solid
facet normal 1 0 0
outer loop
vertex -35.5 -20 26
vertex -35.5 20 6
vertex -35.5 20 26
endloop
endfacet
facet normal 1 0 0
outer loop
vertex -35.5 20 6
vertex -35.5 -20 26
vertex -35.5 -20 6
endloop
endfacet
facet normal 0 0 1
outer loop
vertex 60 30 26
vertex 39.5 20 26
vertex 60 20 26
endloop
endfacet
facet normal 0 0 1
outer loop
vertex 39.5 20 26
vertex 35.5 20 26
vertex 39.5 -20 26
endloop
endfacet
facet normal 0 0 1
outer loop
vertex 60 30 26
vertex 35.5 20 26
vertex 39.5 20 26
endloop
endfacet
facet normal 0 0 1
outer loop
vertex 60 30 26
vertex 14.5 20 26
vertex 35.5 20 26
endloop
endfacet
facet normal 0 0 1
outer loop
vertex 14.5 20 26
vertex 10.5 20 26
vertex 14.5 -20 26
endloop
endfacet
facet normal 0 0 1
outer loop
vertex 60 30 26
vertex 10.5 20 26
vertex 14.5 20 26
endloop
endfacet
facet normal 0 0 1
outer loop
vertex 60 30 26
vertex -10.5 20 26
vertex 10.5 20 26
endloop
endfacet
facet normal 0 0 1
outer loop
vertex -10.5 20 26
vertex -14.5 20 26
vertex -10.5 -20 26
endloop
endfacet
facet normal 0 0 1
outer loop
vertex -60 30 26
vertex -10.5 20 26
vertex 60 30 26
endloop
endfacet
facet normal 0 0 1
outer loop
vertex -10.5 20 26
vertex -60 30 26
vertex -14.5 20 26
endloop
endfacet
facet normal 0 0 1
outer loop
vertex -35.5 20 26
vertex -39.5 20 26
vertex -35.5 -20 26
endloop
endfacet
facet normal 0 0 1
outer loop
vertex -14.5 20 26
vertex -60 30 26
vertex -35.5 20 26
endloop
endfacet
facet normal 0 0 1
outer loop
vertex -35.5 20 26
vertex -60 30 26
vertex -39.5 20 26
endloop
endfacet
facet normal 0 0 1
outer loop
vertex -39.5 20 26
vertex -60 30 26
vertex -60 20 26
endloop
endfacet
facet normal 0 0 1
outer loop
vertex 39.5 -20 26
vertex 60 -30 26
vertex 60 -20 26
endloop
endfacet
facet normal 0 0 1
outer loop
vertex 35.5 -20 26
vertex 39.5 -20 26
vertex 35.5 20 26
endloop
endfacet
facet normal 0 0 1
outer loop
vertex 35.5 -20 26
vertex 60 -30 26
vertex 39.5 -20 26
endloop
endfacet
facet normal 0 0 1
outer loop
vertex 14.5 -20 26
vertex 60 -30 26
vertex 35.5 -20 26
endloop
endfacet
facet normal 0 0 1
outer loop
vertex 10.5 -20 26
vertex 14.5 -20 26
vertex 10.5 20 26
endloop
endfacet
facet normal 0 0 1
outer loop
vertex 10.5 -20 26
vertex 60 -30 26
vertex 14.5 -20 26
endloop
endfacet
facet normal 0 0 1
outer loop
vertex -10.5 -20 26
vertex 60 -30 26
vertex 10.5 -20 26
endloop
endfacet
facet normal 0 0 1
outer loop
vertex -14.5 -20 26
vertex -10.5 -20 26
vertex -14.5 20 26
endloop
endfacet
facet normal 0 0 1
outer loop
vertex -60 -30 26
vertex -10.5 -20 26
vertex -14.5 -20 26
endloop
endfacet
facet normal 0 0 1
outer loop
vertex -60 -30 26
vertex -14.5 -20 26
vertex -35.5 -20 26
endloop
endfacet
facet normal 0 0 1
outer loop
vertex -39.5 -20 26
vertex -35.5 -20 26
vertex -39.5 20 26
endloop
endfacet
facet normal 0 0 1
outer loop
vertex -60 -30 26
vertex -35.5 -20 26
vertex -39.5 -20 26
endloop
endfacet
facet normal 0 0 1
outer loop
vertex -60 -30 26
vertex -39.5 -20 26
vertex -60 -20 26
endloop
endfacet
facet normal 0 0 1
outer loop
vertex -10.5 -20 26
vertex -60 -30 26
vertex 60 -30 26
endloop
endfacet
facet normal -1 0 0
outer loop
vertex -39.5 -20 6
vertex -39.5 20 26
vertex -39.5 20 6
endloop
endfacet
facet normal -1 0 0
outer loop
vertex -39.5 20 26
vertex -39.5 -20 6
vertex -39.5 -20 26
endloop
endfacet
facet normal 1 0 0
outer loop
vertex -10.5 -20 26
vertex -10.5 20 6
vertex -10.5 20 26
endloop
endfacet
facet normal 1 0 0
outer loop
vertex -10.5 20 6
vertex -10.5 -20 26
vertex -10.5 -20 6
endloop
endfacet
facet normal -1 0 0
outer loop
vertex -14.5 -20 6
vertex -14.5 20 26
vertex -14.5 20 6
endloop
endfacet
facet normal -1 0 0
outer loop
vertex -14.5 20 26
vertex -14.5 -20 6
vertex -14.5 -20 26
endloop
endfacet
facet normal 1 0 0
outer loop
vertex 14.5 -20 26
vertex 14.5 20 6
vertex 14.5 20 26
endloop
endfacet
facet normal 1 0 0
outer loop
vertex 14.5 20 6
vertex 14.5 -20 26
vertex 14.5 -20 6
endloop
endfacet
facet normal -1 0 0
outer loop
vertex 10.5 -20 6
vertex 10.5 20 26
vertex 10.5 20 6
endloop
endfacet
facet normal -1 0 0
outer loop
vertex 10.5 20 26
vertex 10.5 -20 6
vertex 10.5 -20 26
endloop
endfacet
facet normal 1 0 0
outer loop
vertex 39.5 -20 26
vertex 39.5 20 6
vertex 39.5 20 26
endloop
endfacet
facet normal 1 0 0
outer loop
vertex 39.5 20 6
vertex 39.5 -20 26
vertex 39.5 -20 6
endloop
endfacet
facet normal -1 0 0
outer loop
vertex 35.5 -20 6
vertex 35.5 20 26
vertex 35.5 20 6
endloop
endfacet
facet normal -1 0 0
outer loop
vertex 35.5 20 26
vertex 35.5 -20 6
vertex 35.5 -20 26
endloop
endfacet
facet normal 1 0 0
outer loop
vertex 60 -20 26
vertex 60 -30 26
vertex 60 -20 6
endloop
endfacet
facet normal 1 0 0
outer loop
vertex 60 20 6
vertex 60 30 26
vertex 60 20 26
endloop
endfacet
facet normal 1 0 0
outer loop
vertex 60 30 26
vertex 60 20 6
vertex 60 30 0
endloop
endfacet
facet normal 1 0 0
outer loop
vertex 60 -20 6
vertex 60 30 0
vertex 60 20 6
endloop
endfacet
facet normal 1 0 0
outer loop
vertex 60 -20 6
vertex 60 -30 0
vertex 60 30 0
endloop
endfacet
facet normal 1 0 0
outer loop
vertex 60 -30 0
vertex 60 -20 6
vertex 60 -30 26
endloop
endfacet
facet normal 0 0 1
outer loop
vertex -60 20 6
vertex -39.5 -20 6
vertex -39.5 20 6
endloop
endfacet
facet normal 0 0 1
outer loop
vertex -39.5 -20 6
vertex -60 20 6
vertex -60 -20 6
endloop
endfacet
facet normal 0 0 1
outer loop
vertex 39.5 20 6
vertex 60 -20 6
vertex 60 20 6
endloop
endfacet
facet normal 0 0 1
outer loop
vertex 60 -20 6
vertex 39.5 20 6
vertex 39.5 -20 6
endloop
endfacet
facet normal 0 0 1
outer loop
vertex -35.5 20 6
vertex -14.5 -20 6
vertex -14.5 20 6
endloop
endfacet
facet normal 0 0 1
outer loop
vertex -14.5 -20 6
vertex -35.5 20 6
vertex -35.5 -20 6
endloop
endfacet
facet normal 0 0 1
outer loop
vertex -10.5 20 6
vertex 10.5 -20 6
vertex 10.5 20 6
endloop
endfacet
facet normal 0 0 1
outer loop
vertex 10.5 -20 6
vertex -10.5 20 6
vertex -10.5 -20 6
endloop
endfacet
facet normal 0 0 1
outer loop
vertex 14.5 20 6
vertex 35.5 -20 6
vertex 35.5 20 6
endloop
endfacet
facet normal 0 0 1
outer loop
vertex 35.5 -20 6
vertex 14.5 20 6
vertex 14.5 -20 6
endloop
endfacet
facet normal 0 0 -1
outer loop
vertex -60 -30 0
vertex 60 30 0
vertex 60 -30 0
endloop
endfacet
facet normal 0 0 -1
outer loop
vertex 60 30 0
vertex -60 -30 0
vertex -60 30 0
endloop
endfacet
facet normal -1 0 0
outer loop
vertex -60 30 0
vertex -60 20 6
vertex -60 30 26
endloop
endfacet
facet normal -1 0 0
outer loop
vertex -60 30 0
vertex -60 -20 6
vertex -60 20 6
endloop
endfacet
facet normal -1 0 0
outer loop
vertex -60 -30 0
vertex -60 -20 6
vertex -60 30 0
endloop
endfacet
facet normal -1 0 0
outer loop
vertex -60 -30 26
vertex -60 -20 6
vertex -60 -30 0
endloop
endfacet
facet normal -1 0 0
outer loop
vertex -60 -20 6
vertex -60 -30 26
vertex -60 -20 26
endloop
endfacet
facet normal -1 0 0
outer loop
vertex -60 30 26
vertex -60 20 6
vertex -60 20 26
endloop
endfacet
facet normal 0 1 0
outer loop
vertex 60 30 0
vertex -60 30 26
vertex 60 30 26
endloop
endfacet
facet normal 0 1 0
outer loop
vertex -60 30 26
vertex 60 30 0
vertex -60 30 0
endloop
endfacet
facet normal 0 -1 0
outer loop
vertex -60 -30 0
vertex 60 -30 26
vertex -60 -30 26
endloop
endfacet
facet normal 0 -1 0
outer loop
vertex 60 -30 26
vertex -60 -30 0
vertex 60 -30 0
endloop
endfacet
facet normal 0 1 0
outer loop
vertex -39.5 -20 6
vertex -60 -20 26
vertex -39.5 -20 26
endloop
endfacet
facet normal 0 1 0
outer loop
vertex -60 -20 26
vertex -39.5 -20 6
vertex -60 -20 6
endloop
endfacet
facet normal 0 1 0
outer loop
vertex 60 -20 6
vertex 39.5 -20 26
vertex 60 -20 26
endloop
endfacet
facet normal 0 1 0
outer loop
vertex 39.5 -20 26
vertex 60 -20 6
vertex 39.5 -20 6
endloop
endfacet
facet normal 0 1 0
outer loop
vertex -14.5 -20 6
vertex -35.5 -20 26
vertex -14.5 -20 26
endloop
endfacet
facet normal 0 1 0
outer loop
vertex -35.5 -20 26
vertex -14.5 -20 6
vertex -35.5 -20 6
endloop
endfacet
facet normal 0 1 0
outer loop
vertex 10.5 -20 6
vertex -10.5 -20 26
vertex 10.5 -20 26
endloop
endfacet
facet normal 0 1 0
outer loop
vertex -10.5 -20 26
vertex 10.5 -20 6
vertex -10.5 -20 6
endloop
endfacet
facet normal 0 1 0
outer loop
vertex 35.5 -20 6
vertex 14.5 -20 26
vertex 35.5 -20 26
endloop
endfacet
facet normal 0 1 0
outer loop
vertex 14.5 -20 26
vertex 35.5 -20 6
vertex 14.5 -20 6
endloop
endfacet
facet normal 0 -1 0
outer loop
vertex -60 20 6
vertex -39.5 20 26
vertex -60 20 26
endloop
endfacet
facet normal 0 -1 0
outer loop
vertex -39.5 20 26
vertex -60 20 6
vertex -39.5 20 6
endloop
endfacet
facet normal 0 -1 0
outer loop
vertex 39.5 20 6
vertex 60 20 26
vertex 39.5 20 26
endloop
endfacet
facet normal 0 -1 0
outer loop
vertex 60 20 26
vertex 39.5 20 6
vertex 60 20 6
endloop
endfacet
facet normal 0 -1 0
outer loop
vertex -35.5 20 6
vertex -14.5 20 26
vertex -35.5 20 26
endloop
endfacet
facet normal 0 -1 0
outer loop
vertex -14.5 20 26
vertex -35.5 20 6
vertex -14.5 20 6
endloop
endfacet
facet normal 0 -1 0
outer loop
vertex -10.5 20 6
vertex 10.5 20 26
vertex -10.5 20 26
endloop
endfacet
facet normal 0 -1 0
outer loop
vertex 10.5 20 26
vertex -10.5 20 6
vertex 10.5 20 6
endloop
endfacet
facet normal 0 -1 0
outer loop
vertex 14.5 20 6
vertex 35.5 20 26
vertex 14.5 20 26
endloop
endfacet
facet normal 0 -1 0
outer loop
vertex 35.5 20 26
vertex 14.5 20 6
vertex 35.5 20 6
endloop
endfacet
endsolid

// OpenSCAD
$fn = 32;

// ----------------------------------------------------------------------
// Rib frame 120 x 60 x 26
// 4 ribs at 25 mm pitch
// ----------------------------------------------------------------------

// --- parameters (mm) ---
frame = [120, 60, 6];  // base plate size (x, y, z)
rail_w = 10;           // side rail width
ribs = 4;              // number of ribs
rib_t = 4;             // rib thickness
rib_h = 20;            // rib height above the base plate
pitch = 25;            // pitch between rib centres

// --- derived feature positions (mm) ---
span = (ribs - 1) * pitch;          // = 75   distance between the outer ribs
origin_x = -span / 2;               // = -37.5   X of the first rib
rib_len = frame[1] - 2 * rail_w + 2;  // = 42   rib length, 1 mm into each rail
feature_centers = [
  [origin_x + 0 * pitch, 0],
  [origin_x + 1 * pitch, 0],
  [origin_x + 2 * pitch, 0],
  [origin_x + 3 * pitch, 0]
];   // rib centre line, drives the rib loop

// base plate, two side rails, then the ribs read straight off feature_centers
union() {
  translate([-frame[0] / 2, -frame[1] / 2, 0]) cube(frame);
  translate([-frame[0] / 2, -frame[1] / 2, 0]) cube([frame[0], rail_w, frame[2] + rib_h]);
  translate([-frame[0] / 2, frame[1] / 2 - rail_w, 0]) cube([frame[0], rail_w, frame[2] + rib_h]);
  for (centre = feature_centers)
    translate([centre[0] - rib_t / 2, centre[1] - rib_len / 2, frame[2] - 1])
      cube([rib_t, rib_len, rib_h + 1]);
}
